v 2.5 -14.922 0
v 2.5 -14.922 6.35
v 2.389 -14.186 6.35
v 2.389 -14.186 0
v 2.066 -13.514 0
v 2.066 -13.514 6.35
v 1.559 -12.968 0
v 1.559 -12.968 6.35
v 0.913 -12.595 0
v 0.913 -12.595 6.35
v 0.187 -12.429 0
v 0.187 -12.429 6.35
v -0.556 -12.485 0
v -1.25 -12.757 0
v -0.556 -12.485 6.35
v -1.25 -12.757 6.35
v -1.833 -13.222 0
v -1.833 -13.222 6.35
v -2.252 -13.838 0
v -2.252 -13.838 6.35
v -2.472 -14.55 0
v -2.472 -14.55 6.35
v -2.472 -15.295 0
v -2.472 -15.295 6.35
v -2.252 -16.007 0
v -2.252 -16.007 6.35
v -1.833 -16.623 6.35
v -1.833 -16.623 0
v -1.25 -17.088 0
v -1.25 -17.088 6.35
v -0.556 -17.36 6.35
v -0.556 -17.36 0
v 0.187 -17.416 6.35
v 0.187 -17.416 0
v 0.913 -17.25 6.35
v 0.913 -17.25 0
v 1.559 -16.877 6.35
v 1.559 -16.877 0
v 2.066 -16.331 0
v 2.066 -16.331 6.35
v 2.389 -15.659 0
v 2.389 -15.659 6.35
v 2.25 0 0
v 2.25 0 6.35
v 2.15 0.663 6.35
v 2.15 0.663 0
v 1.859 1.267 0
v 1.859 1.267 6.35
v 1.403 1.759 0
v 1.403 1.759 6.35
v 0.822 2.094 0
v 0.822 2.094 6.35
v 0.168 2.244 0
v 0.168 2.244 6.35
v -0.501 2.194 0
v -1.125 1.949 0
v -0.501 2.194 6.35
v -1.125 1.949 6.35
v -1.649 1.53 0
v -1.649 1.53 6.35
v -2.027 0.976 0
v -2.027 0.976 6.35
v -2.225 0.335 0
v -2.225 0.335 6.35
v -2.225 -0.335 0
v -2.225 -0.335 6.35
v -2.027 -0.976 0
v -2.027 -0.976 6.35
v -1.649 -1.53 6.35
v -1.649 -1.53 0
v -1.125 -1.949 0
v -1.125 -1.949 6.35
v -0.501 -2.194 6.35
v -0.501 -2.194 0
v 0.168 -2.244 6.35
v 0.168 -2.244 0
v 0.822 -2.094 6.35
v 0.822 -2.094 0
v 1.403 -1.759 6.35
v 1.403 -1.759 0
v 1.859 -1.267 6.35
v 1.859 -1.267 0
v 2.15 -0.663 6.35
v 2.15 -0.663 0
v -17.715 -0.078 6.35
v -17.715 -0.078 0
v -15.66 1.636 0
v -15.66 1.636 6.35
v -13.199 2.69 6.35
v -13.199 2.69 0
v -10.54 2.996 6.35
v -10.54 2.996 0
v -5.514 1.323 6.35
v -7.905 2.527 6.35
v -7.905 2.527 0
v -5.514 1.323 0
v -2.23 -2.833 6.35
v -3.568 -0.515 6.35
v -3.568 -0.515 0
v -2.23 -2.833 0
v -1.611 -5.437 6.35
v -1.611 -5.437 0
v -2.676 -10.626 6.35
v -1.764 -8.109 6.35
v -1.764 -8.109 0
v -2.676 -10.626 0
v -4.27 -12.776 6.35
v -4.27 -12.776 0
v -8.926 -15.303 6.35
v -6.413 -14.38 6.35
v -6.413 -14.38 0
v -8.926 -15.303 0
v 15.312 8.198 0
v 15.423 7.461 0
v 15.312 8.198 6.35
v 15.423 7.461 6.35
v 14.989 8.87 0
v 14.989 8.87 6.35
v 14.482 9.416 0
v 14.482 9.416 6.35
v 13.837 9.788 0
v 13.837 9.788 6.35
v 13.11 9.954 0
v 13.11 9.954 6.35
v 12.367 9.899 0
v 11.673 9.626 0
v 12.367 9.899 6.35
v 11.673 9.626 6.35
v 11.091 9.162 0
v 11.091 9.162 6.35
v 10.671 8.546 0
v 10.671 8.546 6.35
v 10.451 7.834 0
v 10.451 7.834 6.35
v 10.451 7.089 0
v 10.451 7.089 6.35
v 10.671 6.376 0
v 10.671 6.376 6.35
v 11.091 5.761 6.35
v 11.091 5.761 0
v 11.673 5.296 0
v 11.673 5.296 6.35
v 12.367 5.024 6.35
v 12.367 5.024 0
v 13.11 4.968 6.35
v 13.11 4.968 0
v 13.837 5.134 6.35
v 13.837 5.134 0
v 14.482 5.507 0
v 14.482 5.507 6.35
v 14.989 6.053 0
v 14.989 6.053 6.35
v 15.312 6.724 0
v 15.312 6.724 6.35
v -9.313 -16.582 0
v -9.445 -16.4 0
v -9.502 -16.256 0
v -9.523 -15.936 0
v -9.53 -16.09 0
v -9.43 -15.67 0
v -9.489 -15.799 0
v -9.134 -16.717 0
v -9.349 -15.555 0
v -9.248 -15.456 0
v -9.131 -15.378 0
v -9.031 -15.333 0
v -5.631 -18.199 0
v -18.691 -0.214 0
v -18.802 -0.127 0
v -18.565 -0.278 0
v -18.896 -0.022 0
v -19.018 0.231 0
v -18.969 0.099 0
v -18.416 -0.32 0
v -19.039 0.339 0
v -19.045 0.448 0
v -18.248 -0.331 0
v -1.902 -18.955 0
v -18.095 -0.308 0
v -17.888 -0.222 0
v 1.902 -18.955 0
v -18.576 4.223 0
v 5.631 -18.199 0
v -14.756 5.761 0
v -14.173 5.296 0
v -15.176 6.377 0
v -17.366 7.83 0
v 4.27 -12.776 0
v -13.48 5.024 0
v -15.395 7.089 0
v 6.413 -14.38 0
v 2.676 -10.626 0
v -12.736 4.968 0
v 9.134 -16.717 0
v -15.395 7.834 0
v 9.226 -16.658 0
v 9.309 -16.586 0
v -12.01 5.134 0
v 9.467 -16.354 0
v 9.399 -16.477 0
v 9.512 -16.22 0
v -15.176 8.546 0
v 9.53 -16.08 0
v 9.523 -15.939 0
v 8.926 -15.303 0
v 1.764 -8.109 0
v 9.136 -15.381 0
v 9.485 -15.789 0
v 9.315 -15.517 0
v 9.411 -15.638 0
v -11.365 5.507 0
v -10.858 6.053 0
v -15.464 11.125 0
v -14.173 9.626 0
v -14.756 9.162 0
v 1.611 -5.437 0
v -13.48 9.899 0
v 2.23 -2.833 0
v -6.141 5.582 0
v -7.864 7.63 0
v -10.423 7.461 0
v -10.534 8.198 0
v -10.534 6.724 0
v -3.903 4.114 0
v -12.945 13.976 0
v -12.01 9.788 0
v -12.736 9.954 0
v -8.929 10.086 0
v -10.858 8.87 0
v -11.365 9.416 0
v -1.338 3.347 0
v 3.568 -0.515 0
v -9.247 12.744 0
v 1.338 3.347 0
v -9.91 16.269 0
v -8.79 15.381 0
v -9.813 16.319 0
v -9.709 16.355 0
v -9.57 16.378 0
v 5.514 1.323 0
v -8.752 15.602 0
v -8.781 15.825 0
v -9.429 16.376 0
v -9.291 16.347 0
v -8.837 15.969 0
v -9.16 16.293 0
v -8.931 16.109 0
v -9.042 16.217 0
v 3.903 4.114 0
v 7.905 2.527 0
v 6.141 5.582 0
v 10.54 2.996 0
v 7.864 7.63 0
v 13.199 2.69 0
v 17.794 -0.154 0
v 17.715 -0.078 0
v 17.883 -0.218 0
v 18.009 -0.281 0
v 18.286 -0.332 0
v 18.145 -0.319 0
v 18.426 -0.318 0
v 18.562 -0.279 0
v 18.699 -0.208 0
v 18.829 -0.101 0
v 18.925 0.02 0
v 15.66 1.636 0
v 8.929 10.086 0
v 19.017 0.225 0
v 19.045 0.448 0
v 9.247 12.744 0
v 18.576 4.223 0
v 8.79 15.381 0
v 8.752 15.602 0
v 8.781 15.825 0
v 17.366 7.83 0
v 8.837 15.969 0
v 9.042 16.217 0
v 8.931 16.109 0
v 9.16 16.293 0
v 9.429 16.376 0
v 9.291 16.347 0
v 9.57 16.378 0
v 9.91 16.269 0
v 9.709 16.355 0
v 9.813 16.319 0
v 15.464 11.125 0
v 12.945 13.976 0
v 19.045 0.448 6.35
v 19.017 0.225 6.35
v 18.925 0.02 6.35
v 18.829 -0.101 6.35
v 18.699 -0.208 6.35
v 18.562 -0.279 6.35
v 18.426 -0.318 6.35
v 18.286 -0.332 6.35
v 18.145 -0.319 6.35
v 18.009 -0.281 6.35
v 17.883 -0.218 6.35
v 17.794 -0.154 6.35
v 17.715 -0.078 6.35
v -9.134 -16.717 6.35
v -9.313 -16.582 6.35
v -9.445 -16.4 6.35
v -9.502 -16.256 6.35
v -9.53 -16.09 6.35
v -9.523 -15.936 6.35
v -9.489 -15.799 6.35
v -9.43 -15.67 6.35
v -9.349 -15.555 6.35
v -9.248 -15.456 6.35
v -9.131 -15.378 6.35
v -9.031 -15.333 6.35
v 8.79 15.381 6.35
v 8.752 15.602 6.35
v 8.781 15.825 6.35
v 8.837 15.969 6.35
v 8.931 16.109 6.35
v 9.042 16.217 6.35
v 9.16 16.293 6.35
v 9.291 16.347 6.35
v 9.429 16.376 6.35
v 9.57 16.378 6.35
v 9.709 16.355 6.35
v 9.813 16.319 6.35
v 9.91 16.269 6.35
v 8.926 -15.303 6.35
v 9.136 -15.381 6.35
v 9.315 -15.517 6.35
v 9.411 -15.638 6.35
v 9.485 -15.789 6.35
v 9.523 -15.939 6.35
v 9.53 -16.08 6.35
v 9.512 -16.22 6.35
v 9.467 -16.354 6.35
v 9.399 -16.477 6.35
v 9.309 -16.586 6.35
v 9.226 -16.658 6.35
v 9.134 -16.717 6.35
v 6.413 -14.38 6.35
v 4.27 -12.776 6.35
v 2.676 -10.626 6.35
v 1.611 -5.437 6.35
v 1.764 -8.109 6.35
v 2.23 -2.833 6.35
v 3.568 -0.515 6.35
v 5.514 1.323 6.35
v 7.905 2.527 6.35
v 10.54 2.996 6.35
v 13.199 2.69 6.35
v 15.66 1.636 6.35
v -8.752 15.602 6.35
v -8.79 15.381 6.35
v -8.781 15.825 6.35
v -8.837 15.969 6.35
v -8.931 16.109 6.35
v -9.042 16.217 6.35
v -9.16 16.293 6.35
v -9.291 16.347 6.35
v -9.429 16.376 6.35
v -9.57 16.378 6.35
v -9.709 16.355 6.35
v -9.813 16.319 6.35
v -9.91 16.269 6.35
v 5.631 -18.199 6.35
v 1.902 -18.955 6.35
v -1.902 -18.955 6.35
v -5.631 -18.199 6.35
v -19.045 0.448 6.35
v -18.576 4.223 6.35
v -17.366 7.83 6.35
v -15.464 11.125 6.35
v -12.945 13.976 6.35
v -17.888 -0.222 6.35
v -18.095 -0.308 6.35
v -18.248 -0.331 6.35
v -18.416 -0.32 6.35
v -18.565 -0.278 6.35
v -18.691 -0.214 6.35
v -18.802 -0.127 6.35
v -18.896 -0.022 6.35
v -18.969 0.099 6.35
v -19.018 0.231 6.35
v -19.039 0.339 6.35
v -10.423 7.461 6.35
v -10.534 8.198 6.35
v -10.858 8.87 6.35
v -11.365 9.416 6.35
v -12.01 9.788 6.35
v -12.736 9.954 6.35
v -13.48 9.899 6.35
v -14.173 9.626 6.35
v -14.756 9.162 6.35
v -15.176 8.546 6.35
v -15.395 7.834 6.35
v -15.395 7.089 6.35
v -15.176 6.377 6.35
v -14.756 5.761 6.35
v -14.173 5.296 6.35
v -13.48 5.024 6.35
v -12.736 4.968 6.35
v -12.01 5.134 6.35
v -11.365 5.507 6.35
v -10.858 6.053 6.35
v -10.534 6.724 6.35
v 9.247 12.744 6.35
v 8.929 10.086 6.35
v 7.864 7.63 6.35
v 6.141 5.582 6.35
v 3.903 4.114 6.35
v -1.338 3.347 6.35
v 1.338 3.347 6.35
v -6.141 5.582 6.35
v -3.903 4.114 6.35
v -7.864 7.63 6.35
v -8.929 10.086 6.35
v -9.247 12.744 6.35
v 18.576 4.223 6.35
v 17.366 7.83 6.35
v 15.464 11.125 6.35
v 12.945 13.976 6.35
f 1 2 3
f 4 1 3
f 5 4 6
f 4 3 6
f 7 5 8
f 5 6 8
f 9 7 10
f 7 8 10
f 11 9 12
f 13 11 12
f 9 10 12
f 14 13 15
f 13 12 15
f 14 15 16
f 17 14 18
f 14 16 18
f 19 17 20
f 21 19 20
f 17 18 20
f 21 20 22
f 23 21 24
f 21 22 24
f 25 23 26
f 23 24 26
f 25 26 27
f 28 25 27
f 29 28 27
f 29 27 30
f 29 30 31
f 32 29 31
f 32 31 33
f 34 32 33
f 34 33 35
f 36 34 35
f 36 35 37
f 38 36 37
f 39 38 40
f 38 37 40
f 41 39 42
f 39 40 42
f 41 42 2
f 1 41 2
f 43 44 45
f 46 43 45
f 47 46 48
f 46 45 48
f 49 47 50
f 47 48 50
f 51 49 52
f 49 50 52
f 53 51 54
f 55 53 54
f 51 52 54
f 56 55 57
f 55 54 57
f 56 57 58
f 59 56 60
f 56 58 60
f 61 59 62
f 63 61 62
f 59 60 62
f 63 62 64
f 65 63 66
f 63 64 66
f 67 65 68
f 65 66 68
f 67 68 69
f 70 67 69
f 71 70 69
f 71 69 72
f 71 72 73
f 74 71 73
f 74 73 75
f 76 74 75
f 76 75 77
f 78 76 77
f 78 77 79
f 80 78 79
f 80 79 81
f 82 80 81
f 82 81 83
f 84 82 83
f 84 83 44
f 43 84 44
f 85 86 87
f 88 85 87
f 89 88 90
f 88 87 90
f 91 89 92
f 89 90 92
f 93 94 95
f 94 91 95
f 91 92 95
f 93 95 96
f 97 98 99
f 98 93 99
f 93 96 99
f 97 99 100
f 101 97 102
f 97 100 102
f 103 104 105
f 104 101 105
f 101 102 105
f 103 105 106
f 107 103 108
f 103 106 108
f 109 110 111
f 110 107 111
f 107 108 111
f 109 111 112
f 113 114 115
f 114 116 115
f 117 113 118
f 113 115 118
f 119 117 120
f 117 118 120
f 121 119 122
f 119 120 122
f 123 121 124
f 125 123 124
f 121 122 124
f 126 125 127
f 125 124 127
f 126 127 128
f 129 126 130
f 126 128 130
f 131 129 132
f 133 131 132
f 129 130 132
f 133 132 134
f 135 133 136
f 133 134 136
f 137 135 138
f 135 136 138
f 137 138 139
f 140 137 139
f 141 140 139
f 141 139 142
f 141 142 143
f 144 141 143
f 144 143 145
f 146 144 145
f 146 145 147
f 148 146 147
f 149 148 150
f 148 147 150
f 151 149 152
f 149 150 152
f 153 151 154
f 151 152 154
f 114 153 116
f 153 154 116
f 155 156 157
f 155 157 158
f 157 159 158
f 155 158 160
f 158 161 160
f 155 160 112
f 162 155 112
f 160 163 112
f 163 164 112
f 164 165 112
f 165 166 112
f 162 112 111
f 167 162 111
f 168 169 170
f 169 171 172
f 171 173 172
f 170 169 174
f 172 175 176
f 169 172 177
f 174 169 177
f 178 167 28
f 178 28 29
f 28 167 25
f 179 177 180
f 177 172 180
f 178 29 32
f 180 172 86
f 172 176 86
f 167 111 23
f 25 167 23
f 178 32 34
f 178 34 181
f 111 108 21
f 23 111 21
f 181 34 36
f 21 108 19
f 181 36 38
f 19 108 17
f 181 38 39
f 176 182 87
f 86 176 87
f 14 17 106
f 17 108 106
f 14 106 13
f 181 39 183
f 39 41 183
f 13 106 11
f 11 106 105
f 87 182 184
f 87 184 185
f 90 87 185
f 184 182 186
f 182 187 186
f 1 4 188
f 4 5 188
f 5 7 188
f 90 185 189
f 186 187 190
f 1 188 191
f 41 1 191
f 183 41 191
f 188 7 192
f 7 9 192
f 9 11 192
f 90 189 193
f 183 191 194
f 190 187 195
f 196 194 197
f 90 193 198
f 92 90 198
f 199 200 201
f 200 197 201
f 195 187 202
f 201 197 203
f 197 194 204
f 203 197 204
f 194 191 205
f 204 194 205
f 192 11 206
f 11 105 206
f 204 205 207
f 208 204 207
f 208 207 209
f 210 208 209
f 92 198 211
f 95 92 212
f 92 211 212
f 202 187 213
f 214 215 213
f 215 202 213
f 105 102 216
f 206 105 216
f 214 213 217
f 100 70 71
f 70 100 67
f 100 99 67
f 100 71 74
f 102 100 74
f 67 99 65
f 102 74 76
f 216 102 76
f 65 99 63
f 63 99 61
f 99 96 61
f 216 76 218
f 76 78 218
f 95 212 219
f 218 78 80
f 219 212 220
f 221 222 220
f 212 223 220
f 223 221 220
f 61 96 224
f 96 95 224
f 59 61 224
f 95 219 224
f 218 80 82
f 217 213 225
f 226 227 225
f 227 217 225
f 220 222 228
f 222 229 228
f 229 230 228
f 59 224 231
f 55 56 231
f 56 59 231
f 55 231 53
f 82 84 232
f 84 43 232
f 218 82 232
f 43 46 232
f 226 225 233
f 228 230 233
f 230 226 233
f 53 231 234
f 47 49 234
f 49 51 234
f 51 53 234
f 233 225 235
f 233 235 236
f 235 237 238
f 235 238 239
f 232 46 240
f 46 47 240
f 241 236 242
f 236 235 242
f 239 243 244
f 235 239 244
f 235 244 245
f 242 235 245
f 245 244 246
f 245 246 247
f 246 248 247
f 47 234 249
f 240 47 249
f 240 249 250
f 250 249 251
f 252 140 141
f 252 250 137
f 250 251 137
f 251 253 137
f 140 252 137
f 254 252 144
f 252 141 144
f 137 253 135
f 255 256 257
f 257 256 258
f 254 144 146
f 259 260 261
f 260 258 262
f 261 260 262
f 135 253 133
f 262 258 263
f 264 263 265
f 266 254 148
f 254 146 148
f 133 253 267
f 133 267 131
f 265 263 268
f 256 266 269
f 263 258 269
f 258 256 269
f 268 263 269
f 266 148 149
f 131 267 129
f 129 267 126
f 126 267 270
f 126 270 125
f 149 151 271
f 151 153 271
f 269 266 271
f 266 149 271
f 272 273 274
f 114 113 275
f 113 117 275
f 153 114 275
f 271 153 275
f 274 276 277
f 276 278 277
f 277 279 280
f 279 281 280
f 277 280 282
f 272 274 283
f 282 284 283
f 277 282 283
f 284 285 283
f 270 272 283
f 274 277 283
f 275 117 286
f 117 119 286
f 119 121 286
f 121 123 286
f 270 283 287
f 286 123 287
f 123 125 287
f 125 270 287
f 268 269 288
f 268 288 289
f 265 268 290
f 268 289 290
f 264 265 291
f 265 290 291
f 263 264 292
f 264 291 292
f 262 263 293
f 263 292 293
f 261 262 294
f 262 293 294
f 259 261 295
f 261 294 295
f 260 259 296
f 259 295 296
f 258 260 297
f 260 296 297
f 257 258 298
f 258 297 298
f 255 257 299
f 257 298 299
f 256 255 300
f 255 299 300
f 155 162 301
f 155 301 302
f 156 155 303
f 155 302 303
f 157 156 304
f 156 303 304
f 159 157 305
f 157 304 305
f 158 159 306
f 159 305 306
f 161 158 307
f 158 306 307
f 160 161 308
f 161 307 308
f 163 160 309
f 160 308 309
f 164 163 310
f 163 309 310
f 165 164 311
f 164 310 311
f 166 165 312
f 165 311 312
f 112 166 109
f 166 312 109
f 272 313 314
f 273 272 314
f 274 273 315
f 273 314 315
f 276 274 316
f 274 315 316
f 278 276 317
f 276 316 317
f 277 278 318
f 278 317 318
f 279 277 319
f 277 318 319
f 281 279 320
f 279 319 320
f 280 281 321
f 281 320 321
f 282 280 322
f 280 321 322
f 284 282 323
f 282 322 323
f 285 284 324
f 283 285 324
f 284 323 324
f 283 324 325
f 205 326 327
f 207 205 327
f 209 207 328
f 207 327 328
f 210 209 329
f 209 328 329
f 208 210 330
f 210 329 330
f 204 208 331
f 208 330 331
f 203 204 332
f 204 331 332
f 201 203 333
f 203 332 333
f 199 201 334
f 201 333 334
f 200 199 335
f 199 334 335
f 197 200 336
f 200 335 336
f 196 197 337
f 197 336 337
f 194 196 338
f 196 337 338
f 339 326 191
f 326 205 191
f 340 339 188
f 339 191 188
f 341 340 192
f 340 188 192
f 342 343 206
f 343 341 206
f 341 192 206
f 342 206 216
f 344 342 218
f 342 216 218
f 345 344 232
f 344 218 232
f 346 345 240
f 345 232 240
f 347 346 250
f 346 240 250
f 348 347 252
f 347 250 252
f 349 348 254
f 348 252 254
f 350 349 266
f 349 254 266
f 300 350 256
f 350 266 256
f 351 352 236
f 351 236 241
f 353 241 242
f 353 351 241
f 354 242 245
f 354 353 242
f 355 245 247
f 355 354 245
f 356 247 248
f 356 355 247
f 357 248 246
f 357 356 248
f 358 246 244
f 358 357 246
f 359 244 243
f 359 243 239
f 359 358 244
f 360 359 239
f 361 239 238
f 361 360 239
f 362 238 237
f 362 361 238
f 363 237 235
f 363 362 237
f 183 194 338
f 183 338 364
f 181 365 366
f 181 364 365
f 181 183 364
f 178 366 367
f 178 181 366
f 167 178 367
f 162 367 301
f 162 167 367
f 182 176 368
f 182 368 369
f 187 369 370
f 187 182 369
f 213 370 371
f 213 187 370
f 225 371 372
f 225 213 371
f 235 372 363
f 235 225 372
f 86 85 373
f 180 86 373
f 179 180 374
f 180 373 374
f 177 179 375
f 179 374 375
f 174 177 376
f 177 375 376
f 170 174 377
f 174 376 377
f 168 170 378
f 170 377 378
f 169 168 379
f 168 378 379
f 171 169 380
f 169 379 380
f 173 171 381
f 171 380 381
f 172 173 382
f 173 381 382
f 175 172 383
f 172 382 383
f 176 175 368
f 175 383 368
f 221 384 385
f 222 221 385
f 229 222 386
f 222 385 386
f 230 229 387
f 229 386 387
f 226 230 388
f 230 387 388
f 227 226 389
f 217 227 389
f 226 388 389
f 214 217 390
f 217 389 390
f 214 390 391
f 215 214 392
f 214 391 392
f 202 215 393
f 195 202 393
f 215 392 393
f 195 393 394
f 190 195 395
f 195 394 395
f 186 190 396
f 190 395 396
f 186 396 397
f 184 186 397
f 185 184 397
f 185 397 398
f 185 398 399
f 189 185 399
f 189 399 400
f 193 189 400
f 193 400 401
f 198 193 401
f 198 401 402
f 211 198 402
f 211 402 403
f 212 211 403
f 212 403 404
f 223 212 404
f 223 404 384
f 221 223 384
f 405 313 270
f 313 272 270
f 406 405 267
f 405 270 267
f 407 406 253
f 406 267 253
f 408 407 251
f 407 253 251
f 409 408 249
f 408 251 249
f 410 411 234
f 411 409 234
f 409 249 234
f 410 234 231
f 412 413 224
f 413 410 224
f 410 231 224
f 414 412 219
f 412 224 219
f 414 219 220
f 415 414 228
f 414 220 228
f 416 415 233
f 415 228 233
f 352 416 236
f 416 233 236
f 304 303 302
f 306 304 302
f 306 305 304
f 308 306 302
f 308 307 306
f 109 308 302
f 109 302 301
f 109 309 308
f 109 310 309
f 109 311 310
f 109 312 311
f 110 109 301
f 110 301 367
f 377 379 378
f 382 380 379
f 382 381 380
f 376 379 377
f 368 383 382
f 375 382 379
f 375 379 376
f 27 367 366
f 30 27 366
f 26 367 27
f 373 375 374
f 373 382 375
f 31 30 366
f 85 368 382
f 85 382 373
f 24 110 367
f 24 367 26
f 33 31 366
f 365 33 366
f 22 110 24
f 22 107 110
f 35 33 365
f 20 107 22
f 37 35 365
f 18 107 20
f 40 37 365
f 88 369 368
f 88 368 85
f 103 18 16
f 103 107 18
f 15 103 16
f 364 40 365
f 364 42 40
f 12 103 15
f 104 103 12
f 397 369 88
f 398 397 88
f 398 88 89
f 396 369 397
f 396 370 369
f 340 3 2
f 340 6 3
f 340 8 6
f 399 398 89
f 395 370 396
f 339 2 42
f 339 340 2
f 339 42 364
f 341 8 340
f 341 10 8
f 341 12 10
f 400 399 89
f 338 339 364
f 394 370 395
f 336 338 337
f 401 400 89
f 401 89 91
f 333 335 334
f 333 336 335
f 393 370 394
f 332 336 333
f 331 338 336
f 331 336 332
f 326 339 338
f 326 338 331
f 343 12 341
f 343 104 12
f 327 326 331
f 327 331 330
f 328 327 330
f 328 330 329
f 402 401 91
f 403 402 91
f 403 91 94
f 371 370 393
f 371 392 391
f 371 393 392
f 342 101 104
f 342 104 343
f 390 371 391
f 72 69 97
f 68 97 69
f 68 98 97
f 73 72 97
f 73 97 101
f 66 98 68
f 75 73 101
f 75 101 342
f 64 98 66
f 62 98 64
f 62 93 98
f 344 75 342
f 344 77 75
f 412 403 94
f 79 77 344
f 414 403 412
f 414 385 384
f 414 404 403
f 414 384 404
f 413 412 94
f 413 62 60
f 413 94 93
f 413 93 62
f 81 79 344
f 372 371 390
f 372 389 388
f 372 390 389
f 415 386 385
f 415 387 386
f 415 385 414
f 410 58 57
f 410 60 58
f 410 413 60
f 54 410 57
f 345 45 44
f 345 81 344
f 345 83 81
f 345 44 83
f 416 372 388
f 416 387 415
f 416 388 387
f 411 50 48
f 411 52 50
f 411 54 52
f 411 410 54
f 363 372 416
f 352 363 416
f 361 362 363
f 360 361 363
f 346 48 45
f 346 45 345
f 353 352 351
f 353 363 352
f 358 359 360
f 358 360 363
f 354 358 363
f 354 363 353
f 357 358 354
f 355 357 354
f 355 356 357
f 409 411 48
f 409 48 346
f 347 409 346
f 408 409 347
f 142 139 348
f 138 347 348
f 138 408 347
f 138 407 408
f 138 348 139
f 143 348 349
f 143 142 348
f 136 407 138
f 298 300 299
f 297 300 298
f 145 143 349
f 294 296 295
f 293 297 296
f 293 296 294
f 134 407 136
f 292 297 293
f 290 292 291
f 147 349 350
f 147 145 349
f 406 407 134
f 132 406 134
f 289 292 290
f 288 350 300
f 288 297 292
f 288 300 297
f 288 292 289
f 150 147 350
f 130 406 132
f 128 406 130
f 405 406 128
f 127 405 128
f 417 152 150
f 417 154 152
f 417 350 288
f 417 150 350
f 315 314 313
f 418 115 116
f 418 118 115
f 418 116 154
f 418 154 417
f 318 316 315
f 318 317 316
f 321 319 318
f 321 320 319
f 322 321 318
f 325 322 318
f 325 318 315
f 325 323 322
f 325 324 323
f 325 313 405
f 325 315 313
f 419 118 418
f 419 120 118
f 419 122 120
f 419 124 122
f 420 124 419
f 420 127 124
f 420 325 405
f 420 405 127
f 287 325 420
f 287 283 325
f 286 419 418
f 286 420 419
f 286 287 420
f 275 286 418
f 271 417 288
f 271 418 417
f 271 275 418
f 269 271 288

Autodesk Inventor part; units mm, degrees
ref_plane "YZ Plane" through (0, 0, 0) normal (1, 0, 0) x (0, 1, 0)
ref_plane "XZ Plane" through (0, 0, 0) normal (0, 1, 0) x (-1, 0, 0)
ref_plane "XY Plane" through (0, 0, 0) normal (0, 0, 1) x (1, 0, 0)
sketch "Sketch1" plane through (0, 0, 0) normal (0, 0, 1) x (1, 0, 0)
  circle A0 centre (0, 0) radius 12.5 construction
  arc A1 (-7.8805, 17.3436) -> (7.8805, 17.3436) centre (0, 12.5) ccw
  arc A2 (-11.0798, -15.4965) -> (-18.9602, -1.8471) centre (-10.8253, -6.25) ccw
  arc A3 (18.9602, -1.8471) -> (11.0798, -15.4965) centre (10.8253, -6.25) ccw
  arc A4 (-7.8805, 17.3436) -> (-18.9602, -1.8471) centre (0, 0) ccw
  arc A5 (-11.0798, -15.4965) -> (11.0798, -15.4965) centre (0, 0) ccw
  arc A6 (18.9602, -1.8471) -> (7.8805, 17.3436) centre (0, 0) ccw
  dimension "d0" = 25
  dimension "d1" = 18.5
  dimension "d5" = 360
extrude "Extrusion1" add sketch "Sketch1" along normal blind 6.35
fillet "Fillet1" radius 0.762 6 edges at (-7.8805, 17.3436, 3.175) (7.8805, 17.3436, 3.175) (18.9602, -1.8471, 3.175) (11.0798, -15.4965, 3.175) (-11.0798, -15.4965, 3.175) (-18.9602, -1.8471, 3.175)
sketch "Sketch2" plane through (0, 0, 6.35) normal (0, 0, 1) x (1, 0, 0)
  circle A0 centre (0, 0) radius 14.9225 construction
  circle A1 centre (0, -14.9225) radius 2.5
  circle A2 centre (12.9233, 7.4612) radius 2.5
  circle A3 centre (-12.9233, 7.4613) radius 2.5
  dimension "d10" = 29.845
  dimension "d11" = 5
  dimension "d14" = 360
extrude "Extrusion2" cut sketch "Sketch2" against normal blind 6.35
sketch "Sketch3" plane through (0, 0, 6.35) normal (0, 0, 1) x (1, 0, 0)
  circle A0 centre (0, 0) radius 2.25
  dimension "d18" = 4.5
extrude "Extrusion3" cut sketch "Sketch3" against normal blind 6.35
properties part number "battery_holder"
